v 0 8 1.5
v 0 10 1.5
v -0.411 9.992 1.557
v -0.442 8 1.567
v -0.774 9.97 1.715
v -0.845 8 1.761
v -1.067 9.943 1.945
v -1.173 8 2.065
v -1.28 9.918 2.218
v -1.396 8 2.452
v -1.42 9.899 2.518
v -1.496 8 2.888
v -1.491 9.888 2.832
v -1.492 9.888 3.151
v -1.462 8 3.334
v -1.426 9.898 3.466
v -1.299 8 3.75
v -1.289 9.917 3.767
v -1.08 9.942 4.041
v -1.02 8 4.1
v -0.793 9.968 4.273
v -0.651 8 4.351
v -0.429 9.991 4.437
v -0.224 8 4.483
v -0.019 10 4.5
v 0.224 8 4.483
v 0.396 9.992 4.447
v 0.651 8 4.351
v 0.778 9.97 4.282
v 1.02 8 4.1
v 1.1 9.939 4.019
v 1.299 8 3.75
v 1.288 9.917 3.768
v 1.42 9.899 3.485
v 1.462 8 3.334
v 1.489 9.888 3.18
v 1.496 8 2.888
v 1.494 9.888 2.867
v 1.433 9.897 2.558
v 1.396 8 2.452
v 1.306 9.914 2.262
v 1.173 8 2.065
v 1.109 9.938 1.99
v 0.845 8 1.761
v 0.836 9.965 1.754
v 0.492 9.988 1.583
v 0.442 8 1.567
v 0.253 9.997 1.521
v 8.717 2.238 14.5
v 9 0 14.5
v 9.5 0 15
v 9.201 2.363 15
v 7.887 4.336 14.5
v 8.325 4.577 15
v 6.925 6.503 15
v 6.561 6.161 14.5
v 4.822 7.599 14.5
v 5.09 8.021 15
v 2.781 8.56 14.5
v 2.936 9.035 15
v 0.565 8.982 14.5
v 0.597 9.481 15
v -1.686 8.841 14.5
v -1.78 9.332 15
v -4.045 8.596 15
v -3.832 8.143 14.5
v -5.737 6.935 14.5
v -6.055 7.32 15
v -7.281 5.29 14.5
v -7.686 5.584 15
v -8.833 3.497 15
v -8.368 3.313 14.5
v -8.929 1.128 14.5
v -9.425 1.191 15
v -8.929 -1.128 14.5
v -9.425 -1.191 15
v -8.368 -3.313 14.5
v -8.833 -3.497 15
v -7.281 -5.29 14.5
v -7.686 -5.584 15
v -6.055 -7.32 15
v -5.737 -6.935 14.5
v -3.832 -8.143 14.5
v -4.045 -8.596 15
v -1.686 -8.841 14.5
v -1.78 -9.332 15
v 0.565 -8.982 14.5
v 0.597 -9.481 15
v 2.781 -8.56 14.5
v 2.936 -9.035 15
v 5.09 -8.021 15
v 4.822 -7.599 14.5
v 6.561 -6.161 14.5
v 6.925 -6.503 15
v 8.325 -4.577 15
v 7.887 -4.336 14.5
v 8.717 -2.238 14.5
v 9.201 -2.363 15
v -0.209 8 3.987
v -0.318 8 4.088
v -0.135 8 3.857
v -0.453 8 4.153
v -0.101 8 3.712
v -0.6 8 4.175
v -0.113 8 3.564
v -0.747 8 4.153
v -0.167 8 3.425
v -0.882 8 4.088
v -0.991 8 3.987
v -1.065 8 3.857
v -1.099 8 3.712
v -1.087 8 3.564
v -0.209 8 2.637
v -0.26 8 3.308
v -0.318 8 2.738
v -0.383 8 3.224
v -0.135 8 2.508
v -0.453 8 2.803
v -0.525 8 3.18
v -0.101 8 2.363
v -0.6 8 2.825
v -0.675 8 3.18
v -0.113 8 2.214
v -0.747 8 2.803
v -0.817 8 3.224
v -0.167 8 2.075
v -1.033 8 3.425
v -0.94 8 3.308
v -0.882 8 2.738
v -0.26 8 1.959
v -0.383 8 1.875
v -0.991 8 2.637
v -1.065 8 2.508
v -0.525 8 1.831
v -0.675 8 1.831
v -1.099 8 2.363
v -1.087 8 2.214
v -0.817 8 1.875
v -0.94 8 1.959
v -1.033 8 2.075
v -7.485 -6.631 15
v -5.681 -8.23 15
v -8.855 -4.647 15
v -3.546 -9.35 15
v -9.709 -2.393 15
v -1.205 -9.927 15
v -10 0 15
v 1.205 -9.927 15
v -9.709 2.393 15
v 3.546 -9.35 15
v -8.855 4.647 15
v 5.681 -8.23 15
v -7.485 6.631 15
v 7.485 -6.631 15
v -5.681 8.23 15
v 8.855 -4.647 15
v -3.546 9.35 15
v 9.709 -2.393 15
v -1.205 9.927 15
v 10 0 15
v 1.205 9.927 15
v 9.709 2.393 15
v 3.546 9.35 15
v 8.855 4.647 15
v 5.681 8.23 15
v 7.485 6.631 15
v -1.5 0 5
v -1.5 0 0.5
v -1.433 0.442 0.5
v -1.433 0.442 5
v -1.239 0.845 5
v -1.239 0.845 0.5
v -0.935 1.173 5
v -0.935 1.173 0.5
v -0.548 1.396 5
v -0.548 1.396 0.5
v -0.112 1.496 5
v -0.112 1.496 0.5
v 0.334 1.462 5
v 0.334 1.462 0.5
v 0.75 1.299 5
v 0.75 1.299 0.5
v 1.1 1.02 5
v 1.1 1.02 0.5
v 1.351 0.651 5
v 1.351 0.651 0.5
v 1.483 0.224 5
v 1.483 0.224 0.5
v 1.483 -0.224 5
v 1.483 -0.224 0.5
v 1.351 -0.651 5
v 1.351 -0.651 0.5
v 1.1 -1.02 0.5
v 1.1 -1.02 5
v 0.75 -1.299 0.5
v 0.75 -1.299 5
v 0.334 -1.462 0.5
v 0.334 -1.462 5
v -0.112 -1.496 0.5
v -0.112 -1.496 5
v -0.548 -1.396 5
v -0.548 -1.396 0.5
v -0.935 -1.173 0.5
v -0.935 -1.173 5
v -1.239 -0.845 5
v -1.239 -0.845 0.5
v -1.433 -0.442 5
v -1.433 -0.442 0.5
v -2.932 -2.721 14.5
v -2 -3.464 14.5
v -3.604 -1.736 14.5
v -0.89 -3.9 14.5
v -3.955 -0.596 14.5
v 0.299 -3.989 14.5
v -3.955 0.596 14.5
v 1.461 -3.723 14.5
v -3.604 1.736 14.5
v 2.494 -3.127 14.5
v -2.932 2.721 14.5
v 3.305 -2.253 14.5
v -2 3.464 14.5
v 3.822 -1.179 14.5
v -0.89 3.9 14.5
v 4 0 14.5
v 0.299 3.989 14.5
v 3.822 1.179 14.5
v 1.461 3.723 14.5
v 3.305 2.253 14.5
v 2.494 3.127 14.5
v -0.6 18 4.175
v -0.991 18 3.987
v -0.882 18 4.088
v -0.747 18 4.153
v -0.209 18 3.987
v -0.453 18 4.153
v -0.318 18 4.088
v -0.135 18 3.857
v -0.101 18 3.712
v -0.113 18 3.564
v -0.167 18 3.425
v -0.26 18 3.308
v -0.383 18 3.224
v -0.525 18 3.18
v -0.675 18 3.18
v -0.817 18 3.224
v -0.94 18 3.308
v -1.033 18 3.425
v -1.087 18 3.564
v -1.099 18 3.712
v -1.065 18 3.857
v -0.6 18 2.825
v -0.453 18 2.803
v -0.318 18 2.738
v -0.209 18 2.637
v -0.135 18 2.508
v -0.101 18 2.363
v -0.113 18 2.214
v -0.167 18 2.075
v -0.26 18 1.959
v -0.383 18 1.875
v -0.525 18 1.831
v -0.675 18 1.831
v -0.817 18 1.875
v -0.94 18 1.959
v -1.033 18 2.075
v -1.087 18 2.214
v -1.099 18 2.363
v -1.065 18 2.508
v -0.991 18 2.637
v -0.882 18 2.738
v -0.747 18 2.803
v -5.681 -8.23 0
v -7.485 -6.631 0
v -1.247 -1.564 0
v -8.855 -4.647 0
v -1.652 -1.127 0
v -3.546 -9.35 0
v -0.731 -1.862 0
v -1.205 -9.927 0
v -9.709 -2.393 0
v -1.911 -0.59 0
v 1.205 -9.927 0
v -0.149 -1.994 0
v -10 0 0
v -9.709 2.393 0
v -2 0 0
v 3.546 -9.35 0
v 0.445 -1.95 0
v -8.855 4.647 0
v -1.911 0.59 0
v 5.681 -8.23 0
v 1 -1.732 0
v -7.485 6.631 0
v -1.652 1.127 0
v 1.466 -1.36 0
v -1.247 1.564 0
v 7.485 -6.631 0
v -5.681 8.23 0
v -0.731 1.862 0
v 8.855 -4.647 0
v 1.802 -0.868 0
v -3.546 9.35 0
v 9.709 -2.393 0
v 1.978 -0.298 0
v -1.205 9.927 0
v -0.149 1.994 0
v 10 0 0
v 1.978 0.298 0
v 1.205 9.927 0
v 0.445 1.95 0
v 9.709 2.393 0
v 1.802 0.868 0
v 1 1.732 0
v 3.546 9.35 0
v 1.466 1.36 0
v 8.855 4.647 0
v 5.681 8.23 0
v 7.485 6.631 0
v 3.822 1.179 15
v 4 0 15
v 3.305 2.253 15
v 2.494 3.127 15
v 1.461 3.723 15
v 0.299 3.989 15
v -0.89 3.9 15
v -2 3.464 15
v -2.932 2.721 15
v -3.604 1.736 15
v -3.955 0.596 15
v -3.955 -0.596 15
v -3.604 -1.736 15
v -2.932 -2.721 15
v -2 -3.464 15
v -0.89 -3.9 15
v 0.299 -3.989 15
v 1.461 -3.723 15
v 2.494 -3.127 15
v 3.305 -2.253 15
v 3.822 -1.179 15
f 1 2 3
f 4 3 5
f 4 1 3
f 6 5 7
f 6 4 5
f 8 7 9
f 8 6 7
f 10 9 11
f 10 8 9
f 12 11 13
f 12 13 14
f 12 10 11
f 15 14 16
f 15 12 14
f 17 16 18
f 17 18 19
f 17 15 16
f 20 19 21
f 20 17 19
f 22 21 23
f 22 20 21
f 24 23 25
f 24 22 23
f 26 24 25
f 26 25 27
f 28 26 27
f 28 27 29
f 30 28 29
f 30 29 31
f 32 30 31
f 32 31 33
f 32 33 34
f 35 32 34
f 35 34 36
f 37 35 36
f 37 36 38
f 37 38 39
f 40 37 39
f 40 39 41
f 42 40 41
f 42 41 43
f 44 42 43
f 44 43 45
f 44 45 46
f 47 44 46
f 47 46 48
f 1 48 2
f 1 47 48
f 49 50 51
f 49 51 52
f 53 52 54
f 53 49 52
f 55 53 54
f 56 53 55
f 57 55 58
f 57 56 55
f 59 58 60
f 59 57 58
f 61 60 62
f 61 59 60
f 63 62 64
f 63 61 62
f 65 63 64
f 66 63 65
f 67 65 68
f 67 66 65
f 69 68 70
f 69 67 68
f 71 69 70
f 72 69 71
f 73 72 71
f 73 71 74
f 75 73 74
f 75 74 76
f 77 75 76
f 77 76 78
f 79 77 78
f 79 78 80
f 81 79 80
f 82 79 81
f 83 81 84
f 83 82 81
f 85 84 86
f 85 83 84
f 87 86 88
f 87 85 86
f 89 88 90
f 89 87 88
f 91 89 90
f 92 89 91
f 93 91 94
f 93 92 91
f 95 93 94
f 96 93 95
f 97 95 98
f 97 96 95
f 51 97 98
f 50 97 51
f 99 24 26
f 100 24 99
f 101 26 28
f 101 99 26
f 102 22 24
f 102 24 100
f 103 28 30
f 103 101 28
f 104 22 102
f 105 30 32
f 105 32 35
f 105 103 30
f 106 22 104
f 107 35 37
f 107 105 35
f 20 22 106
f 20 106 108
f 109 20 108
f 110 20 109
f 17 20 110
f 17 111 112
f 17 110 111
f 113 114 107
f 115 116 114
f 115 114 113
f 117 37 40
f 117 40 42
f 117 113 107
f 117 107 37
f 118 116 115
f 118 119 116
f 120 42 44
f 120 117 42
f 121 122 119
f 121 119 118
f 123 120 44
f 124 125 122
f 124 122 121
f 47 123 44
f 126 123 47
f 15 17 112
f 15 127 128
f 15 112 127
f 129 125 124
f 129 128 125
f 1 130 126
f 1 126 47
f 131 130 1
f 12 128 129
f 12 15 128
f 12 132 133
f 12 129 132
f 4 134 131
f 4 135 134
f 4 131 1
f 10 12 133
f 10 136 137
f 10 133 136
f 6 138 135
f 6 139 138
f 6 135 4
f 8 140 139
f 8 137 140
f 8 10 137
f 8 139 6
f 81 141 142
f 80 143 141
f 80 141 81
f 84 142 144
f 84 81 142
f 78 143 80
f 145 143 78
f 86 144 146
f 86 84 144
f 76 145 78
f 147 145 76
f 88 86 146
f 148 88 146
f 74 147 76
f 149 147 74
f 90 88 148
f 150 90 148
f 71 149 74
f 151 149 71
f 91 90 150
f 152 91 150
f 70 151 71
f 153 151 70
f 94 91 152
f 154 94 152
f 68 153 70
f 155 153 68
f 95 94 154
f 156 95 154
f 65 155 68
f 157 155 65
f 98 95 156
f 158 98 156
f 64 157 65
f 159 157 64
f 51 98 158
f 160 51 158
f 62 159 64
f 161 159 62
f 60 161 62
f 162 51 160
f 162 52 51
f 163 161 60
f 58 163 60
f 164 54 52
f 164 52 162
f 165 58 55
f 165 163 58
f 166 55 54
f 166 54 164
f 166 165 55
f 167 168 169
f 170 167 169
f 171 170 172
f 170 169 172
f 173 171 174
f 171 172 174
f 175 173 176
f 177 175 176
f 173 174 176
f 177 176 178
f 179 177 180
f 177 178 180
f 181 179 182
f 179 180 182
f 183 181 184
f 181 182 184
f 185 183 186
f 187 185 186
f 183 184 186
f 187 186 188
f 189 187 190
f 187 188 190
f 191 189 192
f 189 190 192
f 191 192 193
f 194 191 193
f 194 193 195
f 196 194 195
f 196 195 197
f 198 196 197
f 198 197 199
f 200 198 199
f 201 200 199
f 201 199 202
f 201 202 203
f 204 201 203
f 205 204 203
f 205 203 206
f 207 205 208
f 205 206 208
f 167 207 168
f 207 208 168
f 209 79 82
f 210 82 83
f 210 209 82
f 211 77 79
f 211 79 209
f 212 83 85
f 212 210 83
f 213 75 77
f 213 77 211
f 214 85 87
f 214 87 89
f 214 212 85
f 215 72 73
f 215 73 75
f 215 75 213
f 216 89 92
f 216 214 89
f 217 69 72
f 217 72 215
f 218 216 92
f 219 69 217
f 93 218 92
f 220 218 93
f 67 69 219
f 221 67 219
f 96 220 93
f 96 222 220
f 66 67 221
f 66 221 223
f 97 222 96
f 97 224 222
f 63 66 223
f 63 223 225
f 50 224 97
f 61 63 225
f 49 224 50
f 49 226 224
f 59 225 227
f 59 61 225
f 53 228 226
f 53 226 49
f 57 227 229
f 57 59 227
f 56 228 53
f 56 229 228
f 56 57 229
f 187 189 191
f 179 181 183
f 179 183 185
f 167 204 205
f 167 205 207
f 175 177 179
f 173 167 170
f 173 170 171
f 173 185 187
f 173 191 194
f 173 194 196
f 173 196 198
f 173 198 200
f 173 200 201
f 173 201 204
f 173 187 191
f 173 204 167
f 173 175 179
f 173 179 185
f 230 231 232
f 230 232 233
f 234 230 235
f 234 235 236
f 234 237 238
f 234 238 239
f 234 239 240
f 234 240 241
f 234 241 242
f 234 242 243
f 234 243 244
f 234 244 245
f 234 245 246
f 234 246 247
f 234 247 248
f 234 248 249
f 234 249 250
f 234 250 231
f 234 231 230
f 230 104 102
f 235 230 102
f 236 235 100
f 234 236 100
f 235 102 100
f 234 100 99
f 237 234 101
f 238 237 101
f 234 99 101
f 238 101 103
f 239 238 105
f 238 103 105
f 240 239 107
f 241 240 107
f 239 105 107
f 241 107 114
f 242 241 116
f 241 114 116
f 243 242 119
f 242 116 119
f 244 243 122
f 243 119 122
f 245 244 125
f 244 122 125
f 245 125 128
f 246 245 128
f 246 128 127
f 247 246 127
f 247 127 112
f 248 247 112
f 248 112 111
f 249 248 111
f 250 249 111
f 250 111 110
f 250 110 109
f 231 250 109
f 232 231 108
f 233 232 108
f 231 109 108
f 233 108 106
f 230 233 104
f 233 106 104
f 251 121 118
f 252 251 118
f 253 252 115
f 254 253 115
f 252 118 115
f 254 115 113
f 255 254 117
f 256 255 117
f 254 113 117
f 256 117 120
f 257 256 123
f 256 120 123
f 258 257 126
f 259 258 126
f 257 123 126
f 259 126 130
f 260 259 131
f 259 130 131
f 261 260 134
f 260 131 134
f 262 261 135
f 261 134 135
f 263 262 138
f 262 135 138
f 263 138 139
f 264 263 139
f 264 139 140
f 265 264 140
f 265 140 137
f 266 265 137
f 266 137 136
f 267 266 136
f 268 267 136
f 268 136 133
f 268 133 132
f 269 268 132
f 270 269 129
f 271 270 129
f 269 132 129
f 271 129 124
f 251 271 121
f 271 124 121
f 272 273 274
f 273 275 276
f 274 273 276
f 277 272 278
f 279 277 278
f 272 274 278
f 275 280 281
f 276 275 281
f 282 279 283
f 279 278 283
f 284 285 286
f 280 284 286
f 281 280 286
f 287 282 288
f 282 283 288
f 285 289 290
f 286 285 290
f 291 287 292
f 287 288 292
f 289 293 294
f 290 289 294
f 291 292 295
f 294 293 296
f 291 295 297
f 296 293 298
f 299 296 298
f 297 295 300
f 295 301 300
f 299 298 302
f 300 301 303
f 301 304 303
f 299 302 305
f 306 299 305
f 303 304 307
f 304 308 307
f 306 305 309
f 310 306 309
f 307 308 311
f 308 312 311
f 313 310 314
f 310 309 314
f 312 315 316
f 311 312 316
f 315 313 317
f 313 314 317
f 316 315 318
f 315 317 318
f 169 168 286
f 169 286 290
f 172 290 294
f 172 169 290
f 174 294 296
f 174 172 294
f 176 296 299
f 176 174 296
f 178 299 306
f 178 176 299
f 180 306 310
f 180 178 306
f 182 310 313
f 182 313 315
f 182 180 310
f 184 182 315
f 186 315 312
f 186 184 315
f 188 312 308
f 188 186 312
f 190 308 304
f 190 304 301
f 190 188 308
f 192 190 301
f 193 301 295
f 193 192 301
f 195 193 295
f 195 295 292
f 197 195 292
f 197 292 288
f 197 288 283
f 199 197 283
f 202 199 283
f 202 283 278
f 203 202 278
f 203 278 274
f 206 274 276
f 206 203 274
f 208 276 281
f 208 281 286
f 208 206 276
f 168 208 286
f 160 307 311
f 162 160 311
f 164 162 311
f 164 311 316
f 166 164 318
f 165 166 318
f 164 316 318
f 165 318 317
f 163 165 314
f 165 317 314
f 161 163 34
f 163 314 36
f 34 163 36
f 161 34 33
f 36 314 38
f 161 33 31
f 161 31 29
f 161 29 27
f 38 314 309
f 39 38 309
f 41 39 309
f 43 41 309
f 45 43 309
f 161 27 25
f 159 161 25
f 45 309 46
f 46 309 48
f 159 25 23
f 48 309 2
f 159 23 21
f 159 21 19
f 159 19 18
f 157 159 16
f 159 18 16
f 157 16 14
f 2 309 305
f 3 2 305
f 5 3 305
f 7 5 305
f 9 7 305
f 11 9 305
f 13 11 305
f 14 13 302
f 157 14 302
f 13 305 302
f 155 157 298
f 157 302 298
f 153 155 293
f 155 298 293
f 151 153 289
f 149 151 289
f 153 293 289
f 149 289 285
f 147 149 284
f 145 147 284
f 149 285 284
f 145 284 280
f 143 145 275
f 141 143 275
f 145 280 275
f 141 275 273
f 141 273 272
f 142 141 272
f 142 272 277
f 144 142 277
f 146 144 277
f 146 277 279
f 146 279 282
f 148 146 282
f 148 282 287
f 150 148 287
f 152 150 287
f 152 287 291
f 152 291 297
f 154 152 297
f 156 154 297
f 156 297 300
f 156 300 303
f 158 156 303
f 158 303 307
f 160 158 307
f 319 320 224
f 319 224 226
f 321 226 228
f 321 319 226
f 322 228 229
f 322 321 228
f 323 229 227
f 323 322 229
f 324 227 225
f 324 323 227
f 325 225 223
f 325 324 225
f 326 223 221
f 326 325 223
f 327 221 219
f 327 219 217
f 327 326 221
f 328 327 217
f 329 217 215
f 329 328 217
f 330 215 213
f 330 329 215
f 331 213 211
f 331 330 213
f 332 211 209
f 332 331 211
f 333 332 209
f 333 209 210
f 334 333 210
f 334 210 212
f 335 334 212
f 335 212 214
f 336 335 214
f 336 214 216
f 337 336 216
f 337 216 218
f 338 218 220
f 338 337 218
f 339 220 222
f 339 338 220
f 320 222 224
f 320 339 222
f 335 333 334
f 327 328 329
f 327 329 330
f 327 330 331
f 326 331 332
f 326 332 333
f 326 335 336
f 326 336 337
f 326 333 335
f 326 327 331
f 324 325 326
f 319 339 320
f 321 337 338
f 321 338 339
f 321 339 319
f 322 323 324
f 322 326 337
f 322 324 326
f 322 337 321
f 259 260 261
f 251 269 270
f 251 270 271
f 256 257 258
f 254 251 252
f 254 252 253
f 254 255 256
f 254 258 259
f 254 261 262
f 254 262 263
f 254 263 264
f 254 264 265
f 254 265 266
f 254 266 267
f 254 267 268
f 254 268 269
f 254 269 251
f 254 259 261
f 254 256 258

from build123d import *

# Parameters (mm, degrees)
SKETCH_1_R          = 10
EXTRUDE_1_DEPTH     = 15
SKETCH_2_R          = 9
SKETCH_2_R_2        = 4
CUT_EXTRUDE_2_DEPTH = 0.5
CHAMFER_1_SIZE      = 0.5
SKETCH_3_R          = 1.5
CUT_EXTRUDE_3_DEPTH = 5
CHAMFER_2_SIZE      = 0.5
SKETCH_4_R          = 1.5
CUT_EXTRUDE_4_DEPTH = 7
SKETCH_5_R          = 0.5
EXTRUDE_2_DEPTH     = 10


with BuildPart() as part:
    # 草图1 → 凸台-拉伸1 (new body)
    with BuildSketch(Plane.XY):
        Circle(SKETCH_1_R)
    extrude(amount=EXTRUDE_1_DEPTH)

    # 草图2 → 切除-拉伸2 (cut)
    with BuildSketch(Plane.XY.offset(15)):
        Circle(SKETCH_2_R)
        Circle(SKETCH_2_R_2, mode=Mode.SUBTRACT)
    extrude(amount=-CUT_EXTRUDE_2_DEPTH, mode=Mode.SUBTRACT)

    # 倒角1
    chamfer_1_edges = [part.edges().sort_by_distance(p)[0] for p in [
        (-9, 0, 15),
    ]]
    chamfer(chamfer_1_edges, length=CHAMFER_1_SIZE - 0.0001)  # a hair under: the kernel refuses the full size

    # 草图3 → 切除-拉伸3 (cut)
    with BuildSketch(Plane(origin=(0, 0, 0), x_dir=(-1, 0, 0), z_dir=(0, 0, -1))):
        Circle(SKETCH_3_R)
    extrude(amount=-CUT_EXTRUDE_3_DEPTH, mode=Mode.SUBTRACT)

    # 倒角2
    chamfer_2_edges = [part.edges().sort_by_distance(p)[0] for p in [
        (1.5, 0, 0),
    ]]
    chamfer(chamfer_2_edges, length=CHAMFER_2_SIZE)

    # 草图4 → 切除-拉伸4 (cut)
    with BuildSketch(Plane(origin=(0, 8, 0), x_dir=(1, 0, 0), z_dir=(0, 1, 0))):
        with Locations(Location((0, -3, 0), (0, 0, 90))):
            Circle(SKETCH_4_R)
    extrude(amount=CUT_EXTRUDE_4_DEPTH, mode=Mode.SUBTRACT)

    # 草图5 → 凸台-拉伸2 (add)
    with BuildSketch(Plane(origin=(0, 8, 0), x_dir=(1, 0, 0), z_dir=(0, 1, 0))):
        with Locations(Location((-0.6, -2.325227292, 0), (0, 0, 270))):
            Circle(SKETCH_5_R)
        with Locations(Location((-0.6, -3.674772708, 0), (0, 0, 270))):
            Circle(SKETCH_5_R)
    extrude(amount=EXTRUDE_2_DEPTH)


solid = part.part
